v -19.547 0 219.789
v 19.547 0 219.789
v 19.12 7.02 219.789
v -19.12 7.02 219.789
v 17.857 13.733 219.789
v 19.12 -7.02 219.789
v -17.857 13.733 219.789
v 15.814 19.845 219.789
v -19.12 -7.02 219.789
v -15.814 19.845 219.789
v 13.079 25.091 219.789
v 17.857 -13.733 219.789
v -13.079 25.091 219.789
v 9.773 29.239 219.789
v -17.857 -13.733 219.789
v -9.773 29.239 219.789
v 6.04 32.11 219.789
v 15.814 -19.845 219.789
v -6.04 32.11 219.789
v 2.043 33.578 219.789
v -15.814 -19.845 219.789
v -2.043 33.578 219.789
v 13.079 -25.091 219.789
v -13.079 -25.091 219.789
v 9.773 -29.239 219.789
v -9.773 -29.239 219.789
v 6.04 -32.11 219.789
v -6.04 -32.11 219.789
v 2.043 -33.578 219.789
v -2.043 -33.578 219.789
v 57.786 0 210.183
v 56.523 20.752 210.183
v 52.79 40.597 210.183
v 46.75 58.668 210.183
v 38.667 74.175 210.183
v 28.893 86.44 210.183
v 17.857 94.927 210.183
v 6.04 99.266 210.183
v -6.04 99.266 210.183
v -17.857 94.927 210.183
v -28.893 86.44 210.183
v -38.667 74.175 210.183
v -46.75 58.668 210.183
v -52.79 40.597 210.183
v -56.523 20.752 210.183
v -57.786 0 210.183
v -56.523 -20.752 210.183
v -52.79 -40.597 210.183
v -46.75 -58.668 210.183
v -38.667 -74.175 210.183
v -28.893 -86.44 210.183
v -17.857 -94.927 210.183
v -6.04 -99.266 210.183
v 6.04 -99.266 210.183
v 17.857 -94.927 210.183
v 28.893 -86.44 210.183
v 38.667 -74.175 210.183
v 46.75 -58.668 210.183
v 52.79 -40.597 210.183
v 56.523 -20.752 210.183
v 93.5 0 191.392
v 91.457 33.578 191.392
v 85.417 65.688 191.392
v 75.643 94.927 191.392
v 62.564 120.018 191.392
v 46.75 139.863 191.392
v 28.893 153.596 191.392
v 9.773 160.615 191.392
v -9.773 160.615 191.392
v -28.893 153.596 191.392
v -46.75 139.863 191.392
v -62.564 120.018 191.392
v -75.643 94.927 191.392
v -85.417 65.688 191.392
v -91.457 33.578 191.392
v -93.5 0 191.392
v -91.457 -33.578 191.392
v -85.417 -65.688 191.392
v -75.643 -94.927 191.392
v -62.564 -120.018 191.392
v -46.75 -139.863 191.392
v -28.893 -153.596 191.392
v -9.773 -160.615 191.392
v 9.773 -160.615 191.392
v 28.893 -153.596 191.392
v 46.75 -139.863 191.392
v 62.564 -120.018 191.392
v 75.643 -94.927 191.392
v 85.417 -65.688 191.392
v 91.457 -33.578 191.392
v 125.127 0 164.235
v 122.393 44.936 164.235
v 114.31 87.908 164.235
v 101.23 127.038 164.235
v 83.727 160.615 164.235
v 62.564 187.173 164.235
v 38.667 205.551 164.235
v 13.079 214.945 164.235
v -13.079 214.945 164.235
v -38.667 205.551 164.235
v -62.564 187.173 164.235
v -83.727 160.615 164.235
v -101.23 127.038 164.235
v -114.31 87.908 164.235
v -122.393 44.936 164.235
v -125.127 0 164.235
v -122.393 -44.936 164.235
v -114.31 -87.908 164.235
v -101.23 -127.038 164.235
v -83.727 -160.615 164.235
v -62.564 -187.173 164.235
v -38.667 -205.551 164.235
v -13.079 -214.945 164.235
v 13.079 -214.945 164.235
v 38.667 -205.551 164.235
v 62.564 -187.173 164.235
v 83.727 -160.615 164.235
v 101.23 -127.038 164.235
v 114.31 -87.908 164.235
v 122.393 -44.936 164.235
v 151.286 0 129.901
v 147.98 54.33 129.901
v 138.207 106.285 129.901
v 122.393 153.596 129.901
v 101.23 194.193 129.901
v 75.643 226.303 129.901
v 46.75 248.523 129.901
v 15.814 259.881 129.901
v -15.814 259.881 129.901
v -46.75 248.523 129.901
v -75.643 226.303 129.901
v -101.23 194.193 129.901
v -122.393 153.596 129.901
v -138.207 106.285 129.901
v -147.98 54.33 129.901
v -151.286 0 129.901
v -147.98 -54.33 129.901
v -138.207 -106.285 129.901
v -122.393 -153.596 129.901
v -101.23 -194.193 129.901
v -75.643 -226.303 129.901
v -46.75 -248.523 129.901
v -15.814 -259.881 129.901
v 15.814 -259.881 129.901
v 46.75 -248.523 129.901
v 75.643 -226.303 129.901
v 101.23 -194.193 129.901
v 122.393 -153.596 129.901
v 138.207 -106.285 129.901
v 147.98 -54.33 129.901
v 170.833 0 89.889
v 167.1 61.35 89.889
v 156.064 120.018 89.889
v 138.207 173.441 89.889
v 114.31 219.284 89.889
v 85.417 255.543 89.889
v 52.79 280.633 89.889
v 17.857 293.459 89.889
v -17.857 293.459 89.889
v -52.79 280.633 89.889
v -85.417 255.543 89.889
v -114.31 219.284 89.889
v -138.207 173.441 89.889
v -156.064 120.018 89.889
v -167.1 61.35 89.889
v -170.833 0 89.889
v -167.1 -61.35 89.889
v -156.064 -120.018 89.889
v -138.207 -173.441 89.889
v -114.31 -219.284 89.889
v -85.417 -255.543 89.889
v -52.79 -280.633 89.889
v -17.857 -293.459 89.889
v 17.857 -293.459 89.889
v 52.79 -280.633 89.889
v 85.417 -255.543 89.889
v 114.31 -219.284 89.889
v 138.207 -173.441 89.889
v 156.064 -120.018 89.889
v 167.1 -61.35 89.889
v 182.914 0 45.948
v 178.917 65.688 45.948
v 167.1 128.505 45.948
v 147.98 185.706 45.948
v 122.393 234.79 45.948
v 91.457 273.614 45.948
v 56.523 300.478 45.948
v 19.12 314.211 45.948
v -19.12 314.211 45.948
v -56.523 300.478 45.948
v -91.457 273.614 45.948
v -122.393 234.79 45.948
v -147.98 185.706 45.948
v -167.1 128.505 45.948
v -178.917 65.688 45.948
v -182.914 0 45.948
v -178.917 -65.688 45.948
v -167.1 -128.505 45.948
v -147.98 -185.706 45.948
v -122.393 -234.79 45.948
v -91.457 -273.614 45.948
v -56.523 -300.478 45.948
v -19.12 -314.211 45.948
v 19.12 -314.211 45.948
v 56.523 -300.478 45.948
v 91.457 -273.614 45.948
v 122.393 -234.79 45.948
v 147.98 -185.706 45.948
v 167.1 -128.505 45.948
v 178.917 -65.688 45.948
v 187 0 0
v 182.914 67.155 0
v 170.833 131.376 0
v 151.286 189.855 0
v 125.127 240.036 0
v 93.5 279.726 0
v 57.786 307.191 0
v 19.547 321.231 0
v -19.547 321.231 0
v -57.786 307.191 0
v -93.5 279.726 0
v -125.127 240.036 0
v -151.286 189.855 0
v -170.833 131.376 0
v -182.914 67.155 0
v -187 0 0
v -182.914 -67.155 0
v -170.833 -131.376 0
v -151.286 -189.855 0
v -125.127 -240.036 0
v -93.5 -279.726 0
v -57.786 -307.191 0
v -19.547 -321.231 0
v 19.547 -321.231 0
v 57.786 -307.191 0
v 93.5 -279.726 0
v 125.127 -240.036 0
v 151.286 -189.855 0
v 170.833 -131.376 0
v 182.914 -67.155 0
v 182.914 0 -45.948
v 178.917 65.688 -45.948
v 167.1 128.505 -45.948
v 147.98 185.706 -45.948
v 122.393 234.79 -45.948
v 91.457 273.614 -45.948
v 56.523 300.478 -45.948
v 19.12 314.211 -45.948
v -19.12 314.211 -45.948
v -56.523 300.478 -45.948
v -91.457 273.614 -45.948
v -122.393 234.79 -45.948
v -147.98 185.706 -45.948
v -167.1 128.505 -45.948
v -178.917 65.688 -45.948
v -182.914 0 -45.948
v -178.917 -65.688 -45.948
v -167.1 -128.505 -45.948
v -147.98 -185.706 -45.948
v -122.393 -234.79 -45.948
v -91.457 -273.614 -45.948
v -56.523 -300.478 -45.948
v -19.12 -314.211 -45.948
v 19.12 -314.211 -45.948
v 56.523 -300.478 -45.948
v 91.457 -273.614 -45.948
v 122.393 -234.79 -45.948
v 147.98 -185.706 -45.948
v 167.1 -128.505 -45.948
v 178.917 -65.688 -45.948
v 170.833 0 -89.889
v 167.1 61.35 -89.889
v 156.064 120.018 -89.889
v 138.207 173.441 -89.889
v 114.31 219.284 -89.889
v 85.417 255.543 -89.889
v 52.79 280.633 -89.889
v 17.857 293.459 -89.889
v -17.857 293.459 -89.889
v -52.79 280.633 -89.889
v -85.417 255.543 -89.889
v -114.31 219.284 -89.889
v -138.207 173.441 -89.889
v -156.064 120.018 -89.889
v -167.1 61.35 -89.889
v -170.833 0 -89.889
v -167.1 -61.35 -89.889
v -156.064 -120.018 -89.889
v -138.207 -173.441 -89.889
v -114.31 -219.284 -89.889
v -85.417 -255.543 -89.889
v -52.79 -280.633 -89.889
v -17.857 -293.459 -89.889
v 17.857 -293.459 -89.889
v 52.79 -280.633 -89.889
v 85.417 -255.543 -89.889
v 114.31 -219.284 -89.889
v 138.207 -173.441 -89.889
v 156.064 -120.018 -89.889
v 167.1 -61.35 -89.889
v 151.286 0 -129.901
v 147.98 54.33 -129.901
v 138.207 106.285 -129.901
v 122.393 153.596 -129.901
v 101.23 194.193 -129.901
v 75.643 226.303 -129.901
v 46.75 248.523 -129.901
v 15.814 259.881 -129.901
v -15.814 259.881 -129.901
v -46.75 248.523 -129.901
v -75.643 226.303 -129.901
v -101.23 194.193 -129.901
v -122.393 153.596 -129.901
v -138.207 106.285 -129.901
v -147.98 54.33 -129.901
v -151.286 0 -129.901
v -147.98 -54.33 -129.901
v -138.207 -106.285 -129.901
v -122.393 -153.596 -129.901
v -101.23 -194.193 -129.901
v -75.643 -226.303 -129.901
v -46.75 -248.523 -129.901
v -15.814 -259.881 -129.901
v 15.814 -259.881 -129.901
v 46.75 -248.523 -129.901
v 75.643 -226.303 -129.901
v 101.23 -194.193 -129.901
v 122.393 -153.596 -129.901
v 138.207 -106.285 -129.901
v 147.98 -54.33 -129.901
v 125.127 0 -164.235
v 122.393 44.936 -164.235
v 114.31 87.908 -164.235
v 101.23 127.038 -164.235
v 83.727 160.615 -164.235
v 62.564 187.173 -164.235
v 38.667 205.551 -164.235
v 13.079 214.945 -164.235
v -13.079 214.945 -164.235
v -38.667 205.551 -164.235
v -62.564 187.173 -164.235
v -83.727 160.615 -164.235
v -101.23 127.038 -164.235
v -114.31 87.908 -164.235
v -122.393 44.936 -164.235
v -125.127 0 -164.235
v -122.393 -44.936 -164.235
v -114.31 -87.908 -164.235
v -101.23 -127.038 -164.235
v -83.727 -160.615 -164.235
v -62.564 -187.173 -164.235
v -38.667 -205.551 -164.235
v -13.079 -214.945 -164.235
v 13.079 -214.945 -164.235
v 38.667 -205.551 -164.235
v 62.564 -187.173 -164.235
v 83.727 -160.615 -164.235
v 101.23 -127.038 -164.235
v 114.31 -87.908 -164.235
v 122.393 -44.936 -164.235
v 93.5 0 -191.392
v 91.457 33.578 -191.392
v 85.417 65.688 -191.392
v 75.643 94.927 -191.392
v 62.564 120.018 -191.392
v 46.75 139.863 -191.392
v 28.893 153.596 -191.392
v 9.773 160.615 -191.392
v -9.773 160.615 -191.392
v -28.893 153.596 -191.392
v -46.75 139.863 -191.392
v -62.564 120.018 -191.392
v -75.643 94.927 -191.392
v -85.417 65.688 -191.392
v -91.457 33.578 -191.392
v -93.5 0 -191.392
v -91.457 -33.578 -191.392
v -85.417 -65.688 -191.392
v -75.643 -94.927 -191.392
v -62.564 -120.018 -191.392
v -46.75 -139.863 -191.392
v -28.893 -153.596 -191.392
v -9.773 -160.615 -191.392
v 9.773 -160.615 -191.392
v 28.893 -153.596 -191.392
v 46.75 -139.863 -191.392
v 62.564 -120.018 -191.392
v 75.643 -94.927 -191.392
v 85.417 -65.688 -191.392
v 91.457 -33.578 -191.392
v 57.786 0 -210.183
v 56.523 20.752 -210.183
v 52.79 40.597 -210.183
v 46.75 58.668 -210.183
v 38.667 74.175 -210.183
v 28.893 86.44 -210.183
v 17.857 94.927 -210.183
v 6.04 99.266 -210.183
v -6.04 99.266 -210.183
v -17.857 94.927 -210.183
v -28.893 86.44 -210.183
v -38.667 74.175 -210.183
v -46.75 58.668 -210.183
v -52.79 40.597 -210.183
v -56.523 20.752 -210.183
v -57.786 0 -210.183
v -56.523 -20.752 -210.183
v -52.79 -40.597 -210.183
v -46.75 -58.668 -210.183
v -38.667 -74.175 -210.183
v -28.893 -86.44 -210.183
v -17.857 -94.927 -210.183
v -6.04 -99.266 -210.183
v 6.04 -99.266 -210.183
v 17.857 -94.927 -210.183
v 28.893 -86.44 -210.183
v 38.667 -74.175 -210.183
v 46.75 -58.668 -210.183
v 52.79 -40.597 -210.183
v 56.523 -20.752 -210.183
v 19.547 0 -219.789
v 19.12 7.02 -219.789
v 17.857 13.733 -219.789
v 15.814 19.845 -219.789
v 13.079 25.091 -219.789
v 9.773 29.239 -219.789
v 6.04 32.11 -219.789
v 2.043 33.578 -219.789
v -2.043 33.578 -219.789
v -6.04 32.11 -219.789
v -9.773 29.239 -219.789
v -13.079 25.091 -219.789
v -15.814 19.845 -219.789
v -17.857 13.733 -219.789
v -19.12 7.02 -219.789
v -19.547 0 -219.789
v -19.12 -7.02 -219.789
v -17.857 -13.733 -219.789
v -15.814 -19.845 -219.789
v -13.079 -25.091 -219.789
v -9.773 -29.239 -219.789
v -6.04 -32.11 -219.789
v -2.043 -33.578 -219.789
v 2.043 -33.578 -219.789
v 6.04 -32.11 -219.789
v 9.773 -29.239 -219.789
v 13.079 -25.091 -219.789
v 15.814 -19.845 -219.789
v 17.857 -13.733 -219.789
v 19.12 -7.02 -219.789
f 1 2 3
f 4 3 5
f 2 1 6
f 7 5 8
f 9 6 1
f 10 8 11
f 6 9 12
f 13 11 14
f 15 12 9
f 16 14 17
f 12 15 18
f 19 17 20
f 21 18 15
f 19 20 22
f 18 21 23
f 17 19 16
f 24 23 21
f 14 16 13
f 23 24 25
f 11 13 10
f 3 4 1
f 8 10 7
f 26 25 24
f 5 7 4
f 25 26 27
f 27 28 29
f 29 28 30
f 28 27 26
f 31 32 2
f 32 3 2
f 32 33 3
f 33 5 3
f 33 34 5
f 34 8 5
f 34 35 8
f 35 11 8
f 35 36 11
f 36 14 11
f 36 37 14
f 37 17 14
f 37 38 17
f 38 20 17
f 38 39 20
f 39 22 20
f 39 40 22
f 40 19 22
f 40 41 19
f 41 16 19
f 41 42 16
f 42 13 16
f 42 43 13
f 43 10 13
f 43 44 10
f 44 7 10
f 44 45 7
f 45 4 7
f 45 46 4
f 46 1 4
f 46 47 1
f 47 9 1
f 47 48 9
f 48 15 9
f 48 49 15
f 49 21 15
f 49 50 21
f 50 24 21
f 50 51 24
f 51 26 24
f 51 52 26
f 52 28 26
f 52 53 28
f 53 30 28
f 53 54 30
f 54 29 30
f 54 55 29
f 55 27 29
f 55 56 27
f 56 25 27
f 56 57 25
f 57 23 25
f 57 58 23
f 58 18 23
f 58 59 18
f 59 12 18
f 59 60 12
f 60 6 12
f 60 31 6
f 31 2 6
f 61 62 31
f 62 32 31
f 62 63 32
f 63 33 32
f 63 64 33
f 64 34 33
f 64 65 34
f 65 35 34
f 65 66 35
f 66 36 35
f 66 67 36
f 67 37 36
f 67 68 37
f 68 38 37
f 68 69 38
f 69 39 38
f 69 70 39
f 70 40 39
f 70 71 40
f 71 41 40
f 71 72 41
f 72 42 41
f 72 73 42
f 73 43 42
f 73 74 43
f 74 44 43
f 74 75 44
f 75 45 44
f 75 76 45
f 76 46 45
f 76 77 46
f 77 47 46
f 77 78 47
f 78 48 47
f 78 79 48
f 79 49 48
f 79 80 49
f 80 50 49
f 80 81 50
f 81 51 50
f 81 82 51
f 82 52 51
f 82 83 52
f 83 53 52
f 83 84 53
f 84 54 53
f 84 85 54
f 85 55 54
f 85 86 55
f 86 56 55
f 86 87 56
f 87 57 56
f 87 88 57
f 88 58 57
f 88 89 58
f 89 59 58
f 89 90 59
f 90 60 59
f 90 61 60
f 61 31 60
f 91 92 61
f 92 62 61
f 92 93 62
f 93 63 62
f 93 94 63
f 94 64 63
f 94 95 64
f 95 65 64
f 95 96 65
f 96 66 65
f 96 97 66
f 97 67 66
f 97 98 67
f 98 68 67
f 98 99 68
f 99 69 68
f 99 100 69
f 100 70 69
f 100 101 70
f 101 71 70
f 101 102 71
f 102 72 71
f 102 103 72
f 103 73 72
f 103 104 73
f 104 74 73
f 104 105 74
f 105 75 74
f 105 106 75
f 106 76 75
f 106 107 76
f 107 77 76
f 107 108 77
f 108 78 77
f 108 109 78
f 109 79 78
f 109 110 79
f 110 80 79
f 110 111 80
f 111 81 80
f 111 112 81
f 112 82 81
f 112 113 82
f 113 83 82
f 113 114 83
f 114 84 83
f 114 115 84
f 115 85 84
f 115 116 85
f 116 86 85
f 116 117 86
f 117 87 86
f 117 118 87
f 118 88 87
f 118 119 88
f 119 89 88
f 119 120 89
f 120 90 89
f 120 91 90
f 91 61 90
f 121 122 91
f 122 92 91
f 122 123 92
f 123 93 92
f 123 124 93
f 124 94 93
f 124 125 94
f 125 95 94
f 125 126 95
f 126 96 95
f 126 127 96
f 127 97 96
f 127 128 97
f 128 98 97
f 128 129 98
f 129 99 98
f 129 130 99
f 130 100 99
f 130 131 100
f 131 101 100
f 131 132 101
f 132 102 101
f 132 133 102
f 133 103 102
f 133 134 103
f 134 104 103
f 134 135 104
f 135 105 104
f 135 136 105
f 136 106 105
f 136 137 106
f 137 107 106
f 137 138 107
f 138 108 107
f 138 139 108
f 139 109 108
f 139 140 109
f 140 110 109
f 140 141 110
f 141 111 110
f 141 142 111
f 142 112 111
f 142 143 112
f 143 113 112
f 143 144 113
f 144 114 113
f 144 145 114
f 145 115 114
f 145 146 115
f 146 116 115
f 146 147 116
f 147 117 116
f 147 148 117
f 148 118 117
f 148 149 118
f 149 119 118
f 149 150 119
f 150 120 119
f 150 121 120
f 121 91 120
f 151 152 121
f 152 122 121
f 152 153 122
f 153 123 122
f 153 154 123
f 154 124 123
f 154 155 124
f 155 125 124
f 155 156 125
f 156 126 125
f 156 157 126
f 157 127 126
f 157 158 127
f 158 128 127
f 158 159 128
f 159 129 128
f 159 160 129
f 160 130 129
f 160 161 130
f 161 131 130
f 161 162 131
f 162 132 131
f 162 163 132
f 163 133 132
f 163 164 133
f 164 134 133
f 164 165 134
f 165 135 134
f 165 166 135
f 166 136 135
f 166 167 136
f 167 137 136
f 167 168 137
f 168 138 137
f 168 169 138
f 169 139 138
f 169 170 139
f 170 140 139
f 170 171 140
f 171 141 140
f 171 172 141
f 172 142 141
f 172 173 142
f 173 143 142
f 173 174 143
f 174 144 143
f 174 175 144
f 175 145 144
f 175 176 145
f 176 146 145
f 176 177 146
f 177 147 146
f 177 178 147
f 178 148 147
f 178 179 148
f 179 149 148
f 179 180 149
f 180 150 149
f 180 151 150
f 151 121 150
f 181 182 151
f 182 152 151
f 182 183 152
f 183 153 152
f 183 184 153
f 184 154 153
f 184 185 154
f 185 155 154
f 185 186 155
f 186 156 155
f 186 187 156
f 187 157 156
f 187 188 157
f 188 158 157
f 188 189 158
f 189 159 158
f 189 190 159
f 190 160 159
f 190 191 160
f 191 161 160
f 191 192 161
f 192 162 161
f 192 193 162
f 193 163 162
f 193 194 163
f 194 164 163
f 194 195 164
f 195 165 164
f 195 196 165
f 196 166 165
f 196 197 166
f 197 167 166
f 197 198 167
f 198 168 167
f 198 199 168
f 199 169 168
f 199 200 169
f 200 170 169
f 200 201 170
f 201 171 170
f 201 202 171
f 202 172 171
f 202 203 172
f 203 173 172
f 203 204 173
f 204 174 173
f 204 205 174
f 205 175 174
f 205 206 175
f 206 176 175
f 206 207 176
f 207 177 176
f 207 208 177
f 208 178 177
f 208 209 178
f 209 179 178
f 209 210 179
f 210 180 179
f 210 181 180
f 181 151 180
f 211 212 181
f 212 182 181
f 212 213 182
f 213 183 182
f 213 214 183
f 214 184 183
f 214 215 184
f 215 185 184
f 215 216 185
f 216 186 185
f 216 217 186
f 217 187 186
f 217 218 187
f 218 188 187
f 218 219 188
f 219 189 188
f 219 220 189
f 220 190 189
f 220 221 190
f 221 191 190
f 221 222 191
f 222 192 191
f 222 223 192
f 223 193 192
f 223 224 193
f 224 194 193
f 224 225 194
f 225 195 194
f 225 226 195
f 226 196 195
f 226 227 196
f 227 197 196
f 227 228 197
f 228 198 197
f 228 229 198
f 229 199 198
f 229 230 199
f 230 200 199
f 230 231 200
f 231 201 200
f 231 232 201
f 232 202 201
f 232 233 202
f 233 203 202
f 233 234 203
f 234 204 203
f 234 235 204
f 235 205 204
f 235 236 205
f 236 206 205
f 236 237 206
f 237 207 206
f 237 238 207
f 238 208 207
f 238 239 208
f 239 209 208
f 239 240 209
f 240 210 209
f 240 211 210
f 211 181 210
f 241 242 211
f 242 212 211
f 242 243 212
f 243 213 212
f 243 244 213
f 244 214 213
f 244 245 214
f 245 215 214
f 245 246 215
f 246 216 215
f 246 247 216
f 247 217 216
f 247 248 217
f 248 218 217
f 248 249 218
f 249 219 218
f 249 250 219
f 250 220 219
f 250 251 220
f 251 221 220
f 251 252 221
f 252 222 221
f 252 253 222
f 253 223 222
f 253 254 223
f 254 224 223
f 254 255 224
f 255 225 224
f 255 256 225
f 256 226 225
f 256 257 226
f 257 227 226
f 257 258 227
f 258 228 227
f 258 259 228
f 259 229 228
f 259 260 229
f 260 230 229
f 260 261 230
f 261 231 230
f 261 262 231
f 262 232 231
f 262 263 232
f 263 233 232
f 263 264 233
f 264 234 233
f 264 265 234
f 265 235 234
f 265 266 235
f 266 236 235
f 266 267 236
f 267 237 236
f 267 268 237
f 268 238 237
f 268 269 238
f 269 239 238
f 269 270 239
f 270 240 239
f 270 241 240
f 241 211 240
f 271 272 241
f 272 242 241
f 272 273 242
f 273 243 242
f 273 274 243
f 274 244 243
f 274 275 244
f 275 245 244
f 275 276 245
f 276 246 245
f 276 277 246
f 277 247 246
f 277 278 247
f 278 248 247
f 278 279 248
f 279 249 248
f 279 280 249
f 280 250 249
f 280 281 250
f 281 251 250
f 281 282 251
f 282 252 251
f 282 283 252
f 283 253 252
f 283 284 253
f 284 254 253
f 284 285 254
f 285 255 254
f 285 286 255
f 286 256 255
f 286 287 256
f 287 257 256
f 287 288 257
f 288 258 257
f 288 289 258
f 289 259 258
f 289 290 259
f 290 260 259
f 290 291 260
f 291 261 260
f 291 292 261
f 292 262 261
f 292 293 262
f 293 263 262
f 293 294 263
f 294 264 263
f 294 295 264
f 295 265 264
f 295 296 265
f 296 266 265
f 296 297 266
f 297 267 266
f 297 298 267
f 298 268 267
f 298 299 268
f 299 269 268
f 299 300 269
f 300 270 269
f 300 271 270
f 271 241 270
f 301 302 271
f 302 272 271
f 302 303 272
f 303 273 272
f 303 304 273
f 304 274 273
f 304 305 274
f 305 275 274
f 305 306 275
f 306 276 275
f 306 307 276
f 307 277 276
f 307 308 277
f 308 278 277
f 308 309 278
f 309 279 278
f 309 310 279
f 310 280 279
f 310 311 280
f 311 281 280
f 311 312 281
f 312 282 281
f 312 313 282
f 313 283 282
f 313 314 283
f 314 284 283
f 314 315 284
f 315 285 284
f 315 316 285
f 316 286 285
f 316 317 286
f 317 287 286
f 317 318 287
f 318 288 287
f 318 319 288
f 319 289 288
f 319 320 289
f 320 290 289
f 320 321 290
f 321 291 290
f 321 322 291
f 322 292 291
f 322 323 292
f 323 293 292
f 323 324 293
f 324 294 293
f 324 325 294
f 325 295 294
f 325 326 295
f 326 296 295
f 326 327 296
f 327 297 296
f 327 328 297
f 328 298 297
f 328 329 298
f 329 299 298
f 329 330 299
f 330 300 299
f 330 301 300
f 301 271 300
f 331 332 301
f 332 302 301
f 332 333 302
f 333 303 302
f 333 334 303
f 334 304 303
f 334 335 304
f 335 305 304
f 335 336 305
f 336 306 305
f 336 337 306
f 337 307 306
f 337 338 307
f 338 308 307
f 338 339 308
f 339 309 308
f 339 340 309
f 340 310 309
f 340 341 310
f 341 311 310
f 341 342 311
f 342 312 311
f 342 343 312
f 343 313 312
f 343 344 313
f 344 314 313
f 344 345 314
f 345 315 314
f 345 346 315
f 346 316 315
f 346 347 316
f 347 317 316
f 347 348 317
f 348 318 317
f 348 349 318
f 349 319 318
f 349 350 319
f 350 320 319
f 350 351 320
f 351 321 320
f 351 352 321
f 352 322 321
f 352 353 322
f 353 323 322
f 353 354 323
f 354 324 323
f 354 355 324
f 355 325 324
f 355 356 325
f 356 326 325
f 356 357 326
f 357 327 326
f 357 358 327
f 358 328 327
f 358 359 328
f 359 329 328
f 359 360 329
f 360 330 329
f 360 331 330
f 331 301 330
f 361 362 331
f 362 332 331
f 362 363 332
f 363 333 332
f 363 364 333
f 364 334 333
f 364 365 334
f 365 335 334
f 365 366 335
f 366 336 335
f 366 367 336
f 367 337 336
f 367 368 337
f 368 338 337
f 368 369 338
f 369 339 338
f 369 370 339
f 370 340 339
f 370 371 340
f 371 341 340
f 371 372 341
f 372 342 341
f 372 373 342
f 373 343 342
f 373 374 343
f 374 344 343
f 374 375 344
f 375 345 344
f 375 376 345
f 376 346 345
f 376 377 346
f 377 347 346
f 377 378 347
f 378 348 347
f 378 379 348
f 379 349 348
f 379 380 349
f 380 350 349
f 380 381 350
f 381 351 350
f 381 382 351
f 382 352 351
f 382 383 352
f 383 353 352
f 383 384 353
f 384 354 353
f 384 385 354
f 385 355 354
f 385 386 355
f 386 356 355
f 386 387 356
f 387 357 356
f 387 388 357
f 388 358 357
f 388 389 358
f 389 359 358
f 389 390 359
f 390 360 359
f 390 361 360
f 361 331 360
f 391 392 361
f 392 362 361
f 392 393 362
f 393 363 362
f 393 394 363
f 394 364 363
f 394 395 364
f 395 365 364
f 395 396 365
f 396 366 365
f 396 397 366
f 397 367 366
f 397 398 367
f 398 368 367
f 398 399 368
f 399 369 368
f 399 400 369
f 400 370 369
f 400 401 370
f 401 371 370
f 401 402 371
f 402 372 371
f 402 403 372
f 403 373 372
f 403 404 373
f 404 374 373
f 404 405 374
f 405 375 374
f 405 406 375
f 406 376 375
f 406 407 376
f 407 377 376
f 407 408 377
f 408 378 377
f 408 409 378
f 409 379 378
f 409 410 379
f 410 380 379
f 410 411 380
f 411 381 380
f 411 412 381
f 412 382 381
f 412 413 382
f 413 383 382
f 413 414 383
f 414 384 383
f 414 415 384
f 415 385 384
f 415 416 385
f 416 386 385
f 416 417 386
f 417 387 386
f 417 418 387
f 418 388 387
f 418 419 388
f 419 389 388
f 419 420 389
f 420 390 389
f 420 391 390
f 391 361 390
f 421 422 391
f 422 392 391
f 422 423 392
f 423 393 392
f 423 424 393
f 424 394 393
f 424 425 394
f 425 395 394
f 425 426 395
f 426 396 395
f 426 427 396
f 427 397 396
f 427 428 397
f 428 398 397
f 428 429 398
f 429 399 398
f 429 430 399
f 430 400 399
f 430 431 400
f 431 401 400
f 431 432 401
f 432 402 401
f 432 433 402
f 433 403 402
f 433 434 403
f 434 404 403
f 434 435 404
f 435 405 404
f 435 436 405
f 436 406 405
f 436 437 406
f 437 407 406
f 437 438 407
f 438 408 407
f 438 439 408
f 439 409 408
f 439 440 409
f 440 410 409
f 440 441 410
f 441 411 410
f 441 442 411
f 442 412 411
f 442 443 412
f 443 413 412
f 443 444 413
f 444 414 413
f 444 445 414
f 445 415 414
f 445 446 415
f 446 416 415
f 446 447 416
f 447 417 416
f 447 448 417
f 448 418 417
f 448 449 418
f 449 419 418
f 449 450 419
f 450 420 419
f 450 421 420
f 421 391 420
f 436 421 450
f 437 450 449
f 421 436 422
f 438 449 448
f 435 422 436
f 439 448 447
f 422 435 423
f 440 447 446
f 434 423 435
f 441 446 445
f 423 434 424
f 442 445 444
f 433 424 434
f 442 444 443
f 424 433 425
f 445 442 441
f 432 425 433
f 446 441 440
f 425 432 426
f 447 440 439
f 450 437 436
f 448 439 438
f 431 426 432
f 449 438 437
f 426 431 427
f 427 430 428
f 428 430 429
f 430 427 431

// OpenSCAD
// Generated by SolidPython 1.0.1 on 2020-07-29 00:46:50


scale(v = [11, 19, 13]) {
	sphere(r = 17);
}
/***********************************************
*********      SolidPython code:      **********
************************************************
 
# import packages: SolidPython
from solid import *
from solid.utils import *
from itertools import chain, combinations, permutations


class Resize:

    def __init__(self, scad_file):
        self.scad_file = scad_file
        #self.scad_file = import_scad(scad_file)
        # cone/cylinder param:
        self.r1 = 0
        self.r2 = 0
        self.h = 0
        # rectangular prism param:
        self.w = 0
        self.l = 0
        # ellipse param:
        self.r = 0

    # import OpenScad code (file name corresponds to shape)


    # classify shape + parameters
    def assign(self, param1, param2, param3):
        if self.scad_file == 'cone.scad':
            self.r1 = param1
            self.r2 = param2
            self.h = param3
        elif self.scad_file == 'cylinder.scad':
            self.r1 = param1
            self.r2 = param2
            self.h = param3
        elif self.scad_file == 'rectangularPrism.scad':
            self.h = param1
            self.l = param2
            self.w = param3
        else:
            self.r = param1
            self.h = param2

    # resize parameters
    def iterate(self):
        x = range(3, 20, 2)
        i = 1
        if self.scad_file == 'cone.scad':
            tempList = list(permutations(x, 2))
            for temp in tempList:
                param1 = temp[0]
                param2 = temp[1]
                filepath = 'produced_scad_files/' + 'cone' + str(param1) + '_' + str(param2) + '_' + '.scad'
                scad_render_to_file(cylinder(h=param1, r1=param2, r2=0), filepath)

        elif self.scad_file == 'cylinder.scad':
            tempList = list(permutations(x, 3))
            for temp in tempList:
                param1 = temp[0]
                param2 = temp[1]
                filepath = 'produced_scad_files/' + 'cylinder' + str(param1) + '_' + str(param2) + '_' + '.scad'
                scad_render_to_file(cylinder(h=param1, r1=param2, r2=param2), filepath)

        elif self.scad_file == 'rectangularPrism.scad':
            tempList = list(permutations(x, 3))
            for temp in tempList:
                param1 = temp[0]
                param2 = temp[1]
                param3 = temp[2]
                filepath = 'produced_scad_files/' + 'rectangularPrism' + str(param1) + '_' + str(param2) + '_' + str(
                    param3) + '.scad'
                scad_render_to_file(cube(size=(param1, param2, param3)), filepath)

        elif self.scad_file == 'ellipse.scad':
            tempList = list(permutations(x, 4))
            for temp in tempList:
                param1 = temp[0]
                param2 = temp[1]
                param3 = temp[2]
                param4 = temp[3]
                filepath = 'produced_scad_files/' + 'ellipse' + str(param1) + '_' + str(param2) + '_' + str(param3) + '_' + str(param4) + '.scad'
                scad_render_to_file(scale([param1, param2, param3])(sphere(r=param4)), filepath)

    def render_to_scadfile(self):
        scad_render_to_file(scad, 'example.scad') 
 
************************************************/
